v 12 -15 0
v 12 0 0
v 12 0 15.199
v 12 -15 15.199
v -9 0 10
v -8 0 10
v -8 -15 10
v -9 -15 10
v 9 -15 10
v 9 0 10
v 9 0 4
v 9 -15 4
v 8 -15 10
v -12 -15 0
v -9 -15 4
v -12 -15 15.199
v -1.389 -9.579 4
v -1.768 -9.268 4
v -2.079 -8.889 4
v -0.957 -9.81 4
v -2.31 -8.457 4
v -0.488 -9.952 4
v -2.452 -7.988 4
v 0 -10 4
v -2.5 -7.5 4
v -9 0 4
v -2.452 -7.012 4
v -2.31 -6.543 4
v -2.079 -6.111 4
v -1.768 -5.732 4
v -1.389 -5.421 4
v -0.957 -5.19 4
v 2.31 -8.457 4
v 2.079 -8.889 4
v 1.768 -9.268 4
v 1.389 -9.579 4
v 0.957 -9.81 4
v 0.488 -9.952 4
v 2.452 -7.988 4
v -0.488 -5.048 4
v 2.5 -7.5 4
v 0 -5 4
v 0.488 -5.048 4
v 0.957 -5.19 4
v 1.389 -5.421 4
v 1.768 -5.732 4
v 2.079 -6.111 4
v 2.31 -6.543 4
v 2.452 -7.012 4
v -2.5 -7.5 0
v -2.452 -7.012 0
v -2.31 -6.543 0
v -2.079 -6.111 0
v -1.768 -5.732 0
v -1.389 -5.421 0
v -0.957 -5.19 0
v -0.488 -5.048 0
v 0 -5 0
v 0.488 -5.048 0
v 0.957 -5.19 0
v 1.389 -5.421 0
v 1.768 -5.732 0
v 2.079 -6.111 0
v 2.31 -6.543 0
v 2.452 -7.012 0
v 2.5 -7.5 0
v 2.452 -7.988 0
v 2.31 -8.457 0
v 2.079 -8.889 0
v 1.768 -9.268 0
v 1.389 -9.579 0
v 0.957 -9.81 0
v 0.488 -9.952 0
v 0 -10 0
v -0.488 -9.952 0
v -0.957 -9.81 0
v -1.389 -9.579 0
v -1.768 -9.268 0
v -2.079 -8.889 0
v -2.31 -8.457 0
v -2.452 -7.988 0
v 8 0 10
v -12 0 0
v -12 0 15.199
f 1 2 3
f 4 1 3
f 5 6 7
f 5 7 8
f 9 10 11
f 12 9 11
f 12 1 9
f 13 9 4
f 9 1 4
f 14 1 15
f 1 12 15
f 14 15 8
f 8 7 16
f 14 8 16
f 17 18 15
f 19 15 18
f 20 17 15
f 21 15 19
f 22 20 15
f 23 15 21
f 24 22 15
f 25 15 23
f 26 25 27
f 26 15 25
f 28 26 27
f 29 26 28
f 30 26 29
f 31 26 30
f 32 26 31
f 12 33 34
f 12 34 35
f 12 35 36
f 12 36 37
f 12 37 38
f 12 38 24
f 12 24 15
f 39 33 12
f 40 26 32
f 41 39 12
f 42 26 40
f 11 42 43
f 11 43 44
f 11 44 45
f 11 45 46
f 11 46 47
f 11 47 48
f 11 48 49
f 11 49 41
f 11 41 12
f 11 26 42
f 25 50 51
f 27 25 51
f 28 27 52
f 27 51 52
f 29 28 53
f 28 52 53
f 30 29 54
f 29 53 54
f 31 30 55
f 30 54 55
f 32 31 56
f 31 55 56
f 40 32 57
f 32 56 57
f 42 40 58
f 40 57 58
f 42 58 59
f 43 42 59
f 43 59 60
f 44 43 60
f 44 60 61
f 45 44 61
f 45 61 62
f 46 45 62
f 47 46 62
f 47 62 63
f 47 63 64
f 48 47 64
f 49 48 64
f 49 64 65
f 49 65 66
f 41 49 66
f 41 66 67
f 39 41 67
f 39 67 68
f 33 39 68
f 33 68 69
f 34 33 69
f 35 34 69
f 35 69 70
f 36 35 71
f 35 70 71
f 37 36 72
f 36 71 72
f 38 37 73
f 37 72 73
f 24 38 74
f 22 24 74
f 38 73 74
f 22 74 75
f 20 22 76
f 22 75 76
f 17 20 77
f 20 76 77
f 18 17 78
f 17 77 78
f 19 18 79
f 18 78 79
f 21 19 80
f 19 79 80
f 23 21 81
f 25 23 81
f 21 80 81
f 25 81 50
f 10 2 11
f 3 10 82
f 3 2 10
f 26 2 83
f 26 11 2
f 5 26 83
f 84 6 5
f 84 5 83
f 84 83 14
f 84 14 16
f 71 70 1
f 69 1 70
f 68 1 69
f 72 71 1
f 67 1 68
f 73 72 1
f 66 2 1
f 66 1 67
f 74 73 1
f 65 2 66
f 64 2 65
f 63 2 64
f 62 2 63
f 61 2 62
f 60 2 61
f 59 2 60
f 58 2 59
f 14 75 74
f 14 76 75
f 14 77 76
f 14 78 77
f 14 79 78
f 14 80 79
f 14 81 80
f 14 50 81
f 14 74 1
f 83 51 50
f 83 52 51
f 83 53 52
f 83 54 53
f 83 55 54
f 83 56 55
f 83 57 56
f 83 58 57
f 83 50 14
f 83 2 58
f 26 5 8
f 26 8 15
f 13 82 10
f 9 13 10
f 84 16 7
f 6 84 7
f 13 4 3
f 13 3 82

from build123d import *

# Parameters (mm, degrees)
F1_DEPTH = 15
F4_D     = 5


with BuildPart() as f1:
    # F0 (on Front) → F1 (new body)
    with BuildSketch(Plane.XZ):
        Polygon((0, 0), (12, 0), (12, 15.199336), (8, 10), (9, 10), (9, 4), (0, 4), align=None)
    extrude(amount=F1_DEPTH)

    # F2: F1 across face


with BuildPart() as f1_1:
    add(f1.part)
    add(f1.part.mirror(Plane(origin=(0, -7.5, 2), x_dir=(0, -1, 0), z_dir=(-1, 0, 0))))

    # F4 (through all)
    with Locations(Plane.XY.offset(4)):
        with Locations((0, -7.5)):
            Hole(F4_D / 2)


solid = f1_1.part
